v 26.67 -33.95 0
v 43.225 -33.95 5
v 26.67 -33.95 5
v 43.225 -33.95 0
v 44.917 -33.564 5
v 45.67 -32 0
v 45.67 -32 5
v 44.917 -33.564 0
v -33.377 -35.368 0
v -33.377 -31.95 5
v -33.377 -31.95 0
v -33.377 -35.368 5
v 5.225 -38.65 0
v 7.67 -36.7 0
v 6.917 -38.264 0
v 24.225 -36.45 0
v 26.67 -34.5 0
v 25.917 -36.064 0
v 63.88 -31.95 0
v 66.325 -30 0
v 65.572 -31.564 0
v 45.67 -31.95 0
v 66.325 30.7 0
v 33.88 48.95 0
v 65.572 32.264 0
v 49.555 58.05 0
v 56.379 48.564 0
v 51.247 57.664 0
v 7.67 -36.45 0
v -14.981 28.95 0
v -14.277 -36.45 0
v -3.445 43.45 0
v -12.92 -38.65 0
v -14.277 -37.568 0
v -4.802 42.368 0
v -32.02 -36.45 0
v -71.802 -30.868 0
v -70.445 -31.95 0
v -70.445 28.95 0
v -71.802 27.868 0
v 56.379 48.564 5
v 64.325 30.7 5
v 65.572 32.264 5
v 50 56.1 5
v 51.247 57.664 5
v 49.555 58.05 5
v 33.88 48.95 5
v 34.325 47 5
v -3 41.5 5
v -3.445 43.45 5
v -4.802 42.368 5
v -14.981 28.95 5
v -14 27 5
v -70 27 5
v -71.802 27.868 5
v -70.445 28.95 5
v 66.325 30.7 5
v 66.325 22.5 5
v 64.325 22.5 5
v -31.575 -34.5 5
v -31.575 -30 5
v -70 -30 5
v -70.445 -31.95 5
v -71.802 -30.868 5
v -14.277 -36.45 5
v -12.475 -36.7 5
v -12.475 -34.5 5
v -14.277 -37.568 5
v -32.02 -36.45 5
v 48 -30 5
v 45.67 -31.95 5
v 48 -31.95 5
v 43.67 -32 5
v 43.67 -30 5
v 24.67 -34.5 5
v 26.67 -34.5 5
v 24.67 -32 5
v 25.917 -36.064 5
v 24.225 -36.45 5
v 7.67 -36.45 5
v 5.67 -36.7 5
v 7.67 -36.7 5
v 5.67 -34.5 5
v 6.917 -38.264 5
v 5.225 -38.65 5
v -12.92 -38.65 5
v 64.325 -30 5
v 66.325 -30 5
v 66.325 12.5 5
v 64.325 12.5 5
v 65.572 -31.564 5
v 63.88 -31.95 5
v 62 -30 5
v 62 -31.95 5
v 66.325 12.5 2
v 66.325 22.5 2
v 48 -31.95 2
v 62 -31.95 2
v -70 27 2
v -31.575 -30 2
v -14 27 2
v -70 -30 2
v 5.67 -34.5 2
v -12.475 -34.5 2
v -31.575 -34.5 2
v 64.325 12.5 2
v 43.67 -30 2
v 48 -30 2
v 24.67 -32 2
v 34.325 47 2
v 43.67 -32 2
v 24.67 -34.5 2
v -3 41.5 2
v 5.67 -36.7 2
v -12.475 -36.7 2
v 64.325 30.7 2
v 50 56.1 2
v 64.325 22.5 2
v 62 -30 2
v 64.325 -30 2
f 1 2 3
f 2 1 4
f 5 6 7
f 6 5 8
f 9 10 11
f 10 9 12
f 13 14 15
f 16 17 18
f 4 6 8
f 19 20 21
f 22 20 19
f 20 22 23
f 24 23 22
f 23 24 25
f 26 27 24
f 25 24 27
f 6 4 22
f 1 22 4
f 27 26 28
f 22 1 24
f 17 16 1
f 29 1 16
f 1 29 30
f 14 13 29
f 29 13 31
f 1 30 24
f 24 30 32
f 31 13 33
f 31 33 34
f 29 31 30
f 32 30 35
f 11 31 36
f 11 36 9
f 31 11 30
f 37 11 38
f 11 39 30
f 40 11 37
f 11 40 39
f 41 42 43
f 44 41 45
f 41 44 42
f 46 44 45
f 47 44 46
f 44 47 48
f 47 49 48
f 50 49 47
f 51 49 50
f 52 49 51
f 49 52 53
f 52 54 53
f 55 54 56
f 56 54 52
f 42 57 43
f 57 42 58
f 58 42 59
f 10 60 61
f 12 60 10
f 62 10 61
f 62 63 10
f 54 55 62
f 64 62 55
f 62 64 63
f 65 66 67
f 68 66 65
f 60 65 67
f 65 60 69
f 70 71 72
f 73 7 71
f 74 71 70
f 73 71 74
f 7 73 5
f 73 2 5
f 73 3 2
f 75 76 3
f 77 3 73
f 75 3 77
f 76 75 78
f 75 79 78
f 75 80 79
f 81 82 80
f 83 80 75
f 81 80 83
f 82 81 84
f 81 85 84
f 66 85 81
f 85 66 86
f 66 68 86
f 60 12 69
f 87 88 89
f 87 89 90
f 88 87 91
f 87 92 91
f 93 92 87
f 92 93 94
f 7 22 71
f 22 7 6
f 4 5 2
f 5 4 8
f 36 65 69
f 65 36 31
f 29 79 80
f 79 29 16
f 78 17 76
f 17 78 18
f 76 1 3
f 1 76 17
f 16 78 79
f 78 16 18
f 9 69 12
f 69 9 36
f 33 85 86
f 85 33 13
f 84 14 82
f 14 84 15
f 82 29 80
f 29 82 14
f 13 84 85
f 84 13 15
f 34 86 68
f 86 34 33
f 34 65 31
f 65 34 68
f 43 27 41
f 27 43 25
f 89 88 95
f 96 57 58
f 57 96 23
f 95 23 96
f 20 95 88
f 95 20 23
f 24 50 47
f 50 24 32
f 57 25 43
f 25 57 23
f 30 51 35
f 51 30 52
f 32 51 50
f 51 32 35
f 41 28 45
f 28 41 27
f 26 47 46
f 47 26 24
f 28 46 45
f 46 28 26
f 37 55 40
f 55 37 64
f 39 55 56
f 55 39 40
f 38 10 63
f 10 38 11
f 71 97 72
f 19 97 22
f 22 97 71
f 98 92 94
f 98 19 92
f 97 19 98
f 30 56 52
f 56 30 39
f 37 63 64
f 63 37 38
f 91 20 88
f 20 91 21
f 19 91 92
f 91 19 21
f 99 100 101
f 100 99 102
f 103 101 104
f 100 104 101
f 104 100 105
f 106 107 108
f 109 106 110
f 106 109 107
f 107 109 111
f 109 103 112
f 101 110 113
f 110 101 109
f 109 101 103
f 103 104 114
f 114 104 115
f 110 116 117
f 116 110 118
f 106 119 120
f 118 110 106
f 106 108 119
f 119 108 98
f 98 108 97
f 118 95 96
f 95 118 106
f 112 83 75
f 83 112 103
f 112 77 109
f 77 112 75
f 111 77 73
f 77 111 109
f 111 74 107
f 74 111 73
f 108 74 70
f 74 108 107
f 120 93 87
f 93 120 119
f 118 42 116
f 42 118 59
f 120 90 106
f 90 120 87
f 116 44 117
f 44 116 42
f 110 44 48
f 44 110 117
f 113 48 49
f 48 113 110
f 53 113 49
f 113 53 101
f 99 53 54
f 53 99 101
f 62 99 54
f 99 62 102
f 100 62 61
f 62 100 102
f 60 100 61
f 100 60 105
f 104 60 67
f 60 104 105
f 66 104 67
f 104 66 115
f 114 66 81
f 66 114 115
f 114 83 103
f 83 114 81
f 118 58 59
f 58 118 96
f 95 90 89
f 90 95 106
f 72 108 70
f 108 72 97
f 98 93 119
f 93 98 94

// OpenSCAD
module pcb_outline()
{
    polygon(points = [
        [ 0, 0 ],
        [ 0, 57 ],
        [ 56, 57 ],
        [ 67, 71.5 ],
        [ 104.325, 77 ],
        [ 120, 86.1 ],
        [ 134.325, 60.7 ],
        [ 134.325, 0 ],
        [ 113.67, 0 ],
        [ 113.67, -2 ],
        [ 94.67, -2 ],
        [ 94.67, -4.5 ],
        [ 75.67, -4.5 ],
        [ 75.67, -6.7 ],
        [ 57.525, -6.7 ],
        [ 57.525, -4.5 ],
        [ 38.425, -4.5 ],
        [ 38.425, 0 ],
    ]);
}

module center_pcb_outline()
{
    translate([ -70, -30, 0 ])
    {
        children();
    }
}

module inner()
{
    translate([ 0, 0, 2 ])
    {
        linear_extrude(height = 8)
        {
            pcb_outline();
        }
    }
}

module outer()
{
    minkowski()
    {
        linear_extrude(height = 5)
        {
            pcb_outline();
        }
        // I don't want to add any height,
        // but it must be non-zero to work.
        cylinder(h = 0.00001, r = 2);
    }
}

module cutout()
{
    translate([ 0, 0, 2 ])
    {
        linear_extrude(10)
        {
            square(size = 10);
        }
    }
}

module trrs_cutout()
{
    translate([ 134, 42.5, 0 ])
    {
        cutout();
    }
}

module usb_cutout()
{
    translate([ 118, -9, 0 ])
    {
        translate([ 0, 0, 2 ])
        {
            linear_extrude(10)
            {
                square(size = 14);
            }
        }
    }
}

module kbd_case()
{
    difference()
    {
        outer();
        inner();
        trrs_cutout();
        usb_cutout();
    }
}

center_pcb_outline() kbd_case();
